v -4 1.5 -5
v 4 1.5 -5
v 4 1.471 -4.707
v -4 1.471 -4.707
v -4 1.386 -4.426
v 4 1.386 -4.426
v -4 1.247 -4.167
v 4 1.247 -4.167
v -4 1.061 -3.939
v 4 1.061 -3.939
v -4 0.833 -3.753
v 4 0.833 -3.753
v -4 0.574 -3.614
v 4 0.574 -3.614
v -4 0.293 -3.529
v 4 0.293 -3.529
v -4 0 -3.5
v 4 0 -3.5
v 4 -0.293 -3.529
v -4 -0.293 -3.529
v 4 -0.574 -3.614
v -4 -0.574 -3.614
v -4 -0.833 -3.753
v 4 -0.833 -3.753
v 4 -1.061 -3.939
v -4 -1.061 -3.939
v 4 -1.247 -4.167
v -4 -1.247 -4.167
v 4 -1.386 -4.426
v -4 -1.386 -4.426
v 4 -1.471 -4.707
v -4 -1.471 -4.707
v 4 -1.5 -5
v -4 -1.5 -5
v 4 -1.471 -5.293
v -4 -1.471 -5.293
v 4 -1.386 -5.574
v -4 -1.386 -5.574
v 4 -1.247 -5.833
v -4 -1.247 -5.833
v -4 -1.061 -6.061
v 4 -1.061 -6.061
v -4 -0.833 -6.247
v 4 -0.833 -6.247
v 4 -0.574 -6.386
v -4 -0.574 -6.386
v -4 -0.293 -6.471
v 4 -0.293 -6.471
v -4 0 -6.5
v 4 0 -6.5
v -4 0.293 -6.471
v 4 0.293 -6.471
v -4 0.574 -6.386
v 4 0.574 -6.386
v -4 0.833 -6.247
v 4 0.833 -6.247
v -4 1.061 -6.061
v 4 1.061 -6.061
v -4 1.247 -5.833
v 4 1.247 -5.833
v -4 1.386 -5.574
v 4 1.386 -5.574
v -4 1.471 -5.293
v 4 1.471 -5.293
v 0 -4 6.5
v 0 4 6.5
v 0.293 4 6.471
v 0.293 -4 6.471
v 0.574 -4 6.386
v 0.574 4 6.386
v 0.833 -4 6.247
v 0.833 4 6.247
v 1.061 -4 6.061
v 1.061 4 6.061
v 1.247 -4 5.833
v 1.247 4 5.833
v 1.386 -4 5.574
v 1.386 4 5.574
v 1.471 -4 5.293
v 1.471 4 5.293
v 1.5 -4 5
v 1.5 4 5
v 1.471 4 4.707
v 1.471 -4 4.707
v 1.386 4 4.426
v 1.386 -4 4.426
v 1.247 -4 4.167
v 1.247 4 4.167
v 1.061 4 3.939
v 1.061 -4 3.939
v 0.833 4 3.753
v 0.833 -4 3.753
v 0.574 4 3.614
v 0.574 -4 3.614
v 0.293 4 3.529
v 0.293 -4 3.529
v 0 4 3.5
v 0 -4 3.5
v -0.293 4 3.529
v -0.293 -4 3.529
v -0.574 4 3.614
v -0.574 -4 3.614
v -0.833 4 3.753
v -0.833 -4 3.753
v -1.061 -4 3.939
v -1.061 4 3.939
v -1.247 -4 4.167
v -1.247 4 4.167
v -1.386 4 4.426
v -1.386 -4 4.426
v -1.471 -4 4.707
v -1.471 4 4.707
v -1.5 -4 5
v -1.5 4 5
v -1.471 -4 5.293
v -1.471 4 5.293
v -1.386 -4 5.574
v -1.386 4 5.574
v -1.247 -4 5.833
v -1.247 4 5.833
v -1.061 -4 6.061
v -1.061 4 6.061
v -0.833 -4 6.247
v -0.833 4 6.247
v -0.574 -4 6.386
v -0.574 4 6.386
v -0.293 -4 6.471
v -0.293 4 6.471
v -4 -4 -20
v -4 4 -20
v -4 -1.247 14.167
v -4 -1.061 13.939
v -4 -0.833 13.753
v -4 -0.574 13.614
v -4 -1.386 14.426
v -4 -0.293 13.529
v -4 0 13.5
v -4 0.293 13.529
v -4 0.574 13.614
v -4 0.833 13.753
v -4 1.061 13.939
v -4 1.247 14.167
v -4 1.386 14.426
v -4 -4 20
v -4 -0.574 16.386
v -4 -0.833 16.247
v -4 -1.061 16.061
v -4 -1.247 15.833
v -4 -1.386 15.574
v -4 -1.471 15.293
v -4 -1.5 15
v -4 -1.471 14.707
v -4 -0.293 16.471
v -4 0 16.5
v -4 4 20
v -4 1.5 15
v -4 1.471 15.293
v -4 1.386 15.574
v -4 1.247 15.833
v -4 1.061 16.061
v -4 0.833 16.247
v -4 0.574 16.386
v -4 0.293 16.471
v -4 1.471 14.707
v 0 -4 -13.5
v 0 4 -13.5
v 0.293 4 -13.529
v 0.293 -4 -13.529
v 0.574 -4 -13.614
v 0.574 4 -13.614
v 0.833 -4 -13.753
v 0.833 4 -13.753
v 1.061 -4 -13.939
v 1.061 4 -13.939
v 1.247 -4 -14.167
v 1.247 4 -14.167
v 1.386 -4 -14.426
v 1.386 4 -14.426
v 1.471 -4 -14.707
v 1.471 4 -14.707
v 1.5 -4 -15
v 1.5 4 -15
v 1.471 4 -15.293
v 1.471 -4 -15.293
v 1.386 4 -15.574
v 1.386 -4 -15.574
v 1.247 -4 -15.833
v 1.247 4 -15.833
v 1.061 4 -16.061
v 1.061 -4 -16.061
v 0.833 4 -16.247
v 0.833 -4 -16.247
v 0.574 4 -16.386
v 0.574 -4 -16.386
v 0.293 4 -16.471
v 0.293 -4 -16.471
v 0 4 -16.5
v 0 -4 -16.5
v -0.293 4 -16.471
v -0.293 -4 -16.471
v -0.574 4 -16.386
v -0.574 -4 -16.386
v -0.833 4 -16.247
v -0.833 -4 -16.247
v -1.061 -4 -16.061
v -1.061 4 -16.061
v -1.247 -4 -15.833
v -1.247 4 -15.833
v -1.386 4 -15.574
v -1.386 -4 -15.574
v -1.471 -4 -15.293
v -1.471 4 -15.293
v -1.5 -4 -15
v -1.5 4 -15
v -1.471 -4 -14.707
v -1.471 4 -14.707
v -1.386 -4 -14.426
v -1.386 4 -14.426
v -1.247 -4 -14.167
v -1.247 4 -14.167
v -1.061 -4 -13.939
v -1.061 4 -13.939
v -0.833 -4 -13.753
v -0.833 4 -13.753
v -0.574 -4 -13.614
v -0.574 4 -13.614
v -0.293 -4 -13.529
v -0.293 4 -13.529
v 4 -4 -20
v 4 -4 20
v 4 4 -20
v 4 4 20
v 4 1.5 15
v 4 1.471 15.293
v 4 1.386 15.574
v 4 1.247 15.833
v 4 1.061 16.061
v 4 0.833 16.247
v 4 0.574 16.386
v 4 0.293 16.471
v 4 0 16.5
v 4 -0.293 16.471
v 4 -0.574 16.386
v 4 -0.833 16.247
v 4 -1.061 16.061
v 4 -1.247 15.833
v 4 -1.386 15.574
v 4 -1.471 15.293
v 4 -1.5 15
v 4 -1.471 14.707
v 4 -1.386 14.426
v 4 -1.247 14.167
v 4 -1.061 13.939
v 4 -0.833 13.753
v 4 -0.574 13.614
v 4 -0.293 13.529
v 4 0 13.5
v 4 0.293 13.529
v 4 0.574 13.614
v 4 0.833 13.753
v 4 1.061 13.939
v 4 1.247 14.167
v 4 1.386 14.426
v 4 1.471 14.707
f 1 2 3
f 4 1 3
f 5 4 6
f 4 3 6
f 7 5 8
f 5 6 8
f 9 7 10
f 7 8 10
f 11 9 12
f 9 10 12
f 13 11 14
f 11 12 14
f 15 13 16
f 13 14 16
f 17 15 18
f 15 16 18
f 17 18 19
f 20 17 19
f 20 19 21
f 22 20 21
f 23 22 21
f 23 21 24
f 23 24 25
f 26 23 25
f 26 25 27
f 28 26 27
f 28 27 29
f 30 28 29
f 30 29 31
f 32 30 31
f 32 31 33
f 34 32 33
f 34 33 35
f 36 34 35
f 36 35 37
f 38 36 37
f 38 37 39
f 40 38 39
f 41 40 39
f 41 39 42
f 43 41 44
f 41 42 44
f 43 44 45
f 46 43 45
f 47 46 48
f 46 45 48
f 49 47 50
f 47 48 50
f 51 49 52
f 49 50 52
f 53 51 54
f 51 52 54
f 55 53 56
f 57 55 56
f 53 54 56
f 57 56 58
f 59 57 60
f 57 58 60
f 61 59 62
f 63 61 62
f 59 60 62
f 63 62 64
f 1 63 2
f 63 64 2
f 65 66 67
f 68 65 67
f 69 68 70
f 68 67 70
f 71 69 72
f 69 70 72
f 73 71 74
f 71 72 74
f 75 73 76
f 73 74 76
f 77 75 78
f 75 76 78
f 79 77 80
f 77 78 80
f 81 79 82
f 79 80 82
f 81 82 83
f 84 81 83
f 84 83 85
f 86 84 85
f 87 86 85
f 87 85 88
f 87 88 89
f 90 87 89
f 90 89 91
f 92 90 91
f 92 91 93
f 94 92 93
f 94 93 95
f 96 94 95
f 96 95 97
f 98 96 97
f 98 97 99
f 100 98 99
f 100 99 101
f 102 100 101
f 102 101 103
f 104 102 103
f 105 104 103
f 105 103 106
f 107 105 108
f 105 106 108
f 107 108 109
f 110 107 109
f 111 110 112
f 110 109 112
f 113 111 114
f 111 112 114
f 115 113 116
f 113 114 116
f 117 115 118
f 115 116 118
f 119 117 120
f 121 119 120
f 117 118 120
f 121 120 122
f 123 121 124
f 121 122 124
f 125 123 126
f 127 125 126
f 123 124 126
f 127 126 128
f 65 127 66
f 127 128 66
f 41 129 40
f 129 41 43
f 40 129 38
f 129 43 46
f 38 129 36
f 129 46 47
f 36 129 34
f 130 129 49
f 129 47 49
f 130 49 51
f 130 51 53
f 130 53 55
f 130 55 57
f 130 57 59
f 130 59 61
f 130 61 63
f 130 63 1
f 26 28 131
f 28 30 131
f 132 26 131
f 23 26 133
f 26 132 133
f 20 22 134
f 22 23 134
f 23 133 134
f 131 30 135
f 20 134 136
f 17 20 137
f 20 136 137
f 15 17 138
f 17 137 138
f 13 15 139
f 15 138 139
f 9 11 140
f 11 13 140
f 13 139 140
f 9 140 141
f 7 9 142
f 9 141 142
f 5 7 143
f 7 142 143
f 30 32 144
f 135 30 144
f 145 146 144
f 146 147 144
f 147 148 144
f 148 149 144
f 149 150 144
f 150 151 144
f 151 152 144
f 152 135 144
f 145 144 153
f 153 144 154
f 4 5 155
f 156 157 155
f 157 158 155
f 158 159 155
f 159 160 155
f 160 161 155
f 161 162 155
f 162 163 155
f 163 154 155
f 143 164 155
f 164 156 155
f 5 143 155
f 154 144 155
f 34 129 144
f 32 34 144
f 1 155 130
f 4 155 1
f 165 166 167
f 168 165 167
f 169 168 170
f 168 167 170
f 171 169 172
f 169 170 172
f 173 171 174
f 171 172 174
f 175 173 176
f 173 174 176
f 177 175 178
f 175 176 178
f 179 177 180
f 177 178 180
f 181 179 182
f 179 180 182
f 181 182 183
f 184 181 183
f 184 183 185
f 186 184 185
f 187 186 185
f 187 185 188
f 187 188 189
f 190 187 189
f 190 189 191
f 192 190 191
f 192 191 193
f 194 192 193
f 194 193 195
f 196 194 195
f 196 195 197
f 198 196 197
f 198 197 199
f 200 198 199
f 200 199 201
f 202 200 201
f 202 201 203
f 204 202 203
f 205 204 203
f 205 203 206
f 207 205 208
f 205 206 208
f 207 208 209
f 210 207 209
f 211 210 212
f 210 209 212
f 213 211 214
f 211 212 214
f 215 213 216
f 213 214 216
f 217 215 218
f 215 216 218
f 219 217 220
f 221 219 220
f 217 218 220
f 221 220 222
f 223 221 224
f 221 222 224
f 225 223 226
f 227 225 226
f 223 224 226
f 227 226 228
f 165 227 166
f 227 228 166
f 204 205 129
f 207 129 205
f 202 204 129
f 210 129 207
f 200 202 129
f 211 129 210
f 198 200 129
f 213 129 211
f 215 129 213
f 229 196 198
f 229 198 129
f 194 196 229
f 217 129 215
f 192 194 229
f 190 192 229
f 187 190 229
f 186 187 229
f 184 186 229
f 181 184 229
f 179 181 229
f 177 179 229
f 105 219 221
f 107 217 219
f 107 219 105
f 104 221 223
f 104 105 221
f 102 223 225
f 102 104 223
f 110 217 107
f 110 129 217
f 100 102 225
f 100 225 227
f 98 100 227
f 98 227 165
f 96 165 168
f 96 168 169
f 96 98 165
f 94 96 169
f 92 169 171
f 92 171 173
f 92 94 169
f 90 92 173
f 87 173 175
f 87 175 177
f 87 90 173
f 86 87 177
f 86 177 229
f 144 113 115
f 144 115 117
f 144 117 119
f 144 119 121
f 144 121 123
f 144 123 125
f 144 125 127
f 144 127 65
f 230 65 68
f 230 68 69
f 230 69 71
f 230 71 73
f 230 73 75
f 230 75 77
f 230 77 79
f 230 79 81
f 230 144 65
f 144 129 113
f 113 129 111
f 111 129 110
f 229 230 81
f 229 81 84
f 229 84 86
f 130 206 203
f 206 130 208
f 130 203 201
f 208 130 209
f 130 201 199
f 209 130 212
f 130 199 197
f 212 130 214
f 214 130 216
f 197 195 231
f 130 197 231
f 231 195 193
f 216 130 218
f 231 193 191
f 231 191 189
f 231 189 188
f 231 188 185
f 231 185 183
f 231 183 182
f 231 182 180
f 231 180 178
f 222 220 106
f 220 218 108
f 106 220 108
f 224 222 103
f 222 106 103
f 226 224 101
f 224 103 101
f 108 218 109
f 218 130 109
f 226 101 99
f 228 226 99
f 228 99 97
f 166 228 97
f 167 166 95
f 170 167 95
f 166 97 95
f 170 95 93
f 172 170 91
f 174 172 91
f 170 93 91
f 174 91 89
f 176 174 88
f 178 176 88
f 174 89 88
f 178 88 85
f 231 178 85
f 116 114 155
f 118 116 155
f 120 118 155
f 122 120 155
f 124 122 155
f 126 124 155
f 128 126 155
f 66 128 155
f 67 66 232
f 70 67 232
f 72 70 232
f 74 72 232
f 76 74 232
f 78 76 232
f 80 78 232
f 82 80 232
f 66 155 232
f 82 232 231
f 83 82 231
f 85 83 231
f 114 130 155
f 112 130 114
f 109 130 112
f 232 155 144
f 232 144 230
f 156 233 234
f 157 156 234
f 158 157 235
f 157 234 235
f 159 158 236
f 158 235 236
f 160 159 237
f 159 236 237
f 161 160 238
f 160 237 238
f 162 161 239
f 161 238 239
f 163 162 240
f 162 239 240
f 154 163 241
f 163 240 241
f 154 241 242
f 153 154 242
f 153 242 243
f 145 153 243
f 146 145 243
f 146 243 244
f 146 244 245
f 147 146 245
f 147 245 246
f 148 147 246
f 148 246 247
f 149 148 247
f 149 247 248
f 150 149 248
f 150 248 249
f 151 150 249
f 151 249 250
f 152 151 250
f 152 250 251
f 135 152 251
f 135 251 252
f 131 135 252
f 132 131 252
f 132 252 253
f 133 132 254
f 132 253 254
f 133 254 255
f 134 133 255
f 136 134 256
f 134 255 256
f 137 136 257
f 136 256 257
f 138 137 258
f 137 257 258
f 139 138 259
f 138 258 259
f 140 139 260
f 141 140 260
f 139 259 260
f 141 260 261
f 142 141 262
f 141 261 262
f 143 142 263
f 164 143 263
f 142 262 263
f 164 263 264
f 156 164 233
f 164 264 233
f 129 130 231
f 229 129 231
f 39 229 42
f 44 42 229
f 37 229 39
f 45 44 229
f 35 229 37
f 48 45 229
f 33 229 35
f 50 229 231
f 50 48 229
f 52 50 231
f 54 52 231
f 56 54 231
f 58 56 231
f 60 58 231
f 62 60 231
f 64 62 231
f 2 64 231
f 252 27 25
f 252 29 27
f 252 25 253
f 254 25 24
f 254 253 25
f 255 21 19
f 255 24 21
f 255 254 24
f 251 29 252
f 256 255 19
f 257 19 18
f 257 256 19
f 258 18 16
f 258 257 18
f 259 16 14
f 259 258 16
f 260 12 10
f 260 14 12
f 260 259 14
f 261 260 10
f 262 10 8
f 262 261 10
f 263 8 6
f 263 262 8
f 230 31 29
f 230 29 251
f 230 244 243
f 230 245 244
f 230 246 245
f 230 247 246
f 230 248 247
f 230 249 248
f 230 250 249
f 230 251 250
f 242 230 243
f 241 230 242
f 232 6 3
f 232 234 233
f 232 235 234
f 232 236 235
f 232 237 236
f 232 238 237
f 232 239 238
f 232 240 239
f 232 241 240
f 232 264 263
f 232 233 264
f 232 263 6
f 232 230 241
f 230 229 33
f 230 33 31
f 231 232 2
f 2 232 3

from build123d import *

# Parameters (mm, degrees)
SKETCH_1_W          = 8
SKETCH_1_H          = 8
EXTRUDE_1_DEPTH     = 20
CUT_EXTRUDE_1_REACH = 23.909
SKETCH_2_R          = 1.5
CUT_EXTRUDE_2_REACH = 23.909
SKETCH_3_R          = 1.5


with BuildPart() as part:
    # 草图1 → 凸台-拉伸1 (new, symmetric)
    with BuildSketch(Plane.XY):
        Rectangle(SKETCH_1_W, SKETCH_1_H)
    extrude(amount=EXTRUDE_1_DEPTH, both=True)

    # 草图2 → 切除-拉伸1 (cut, up to next)
    with BuildSketch(Plane(origin=(4, 0, 0), x_dir=(0, 0, -1), z_dir=(1, 0, 0)), mode=Mode.PRIVATE) as cut_extrude_1_sk1:
        with Locations(Location((-15, 0, 0), (0, 0, 90))):
            Circle(SKETCH_2_R)
    cut_extrude_1_tool1 = extrude(cut_extrude_1_sk1.sketch, amount=-CUT_EXTRUDE_1_REACH, mode=Mode.PRIVATE) & part.part
    # 草图2 → 切除-拉伸1 (cut, up to next)
    with BuildSketch(Plane(origin=(4, 0, 0), x_dir=(0, 0, -1), z_dir=(1, 0, 0)), mode=Mode.PRIVATE) as cut_extrude_1_sk2:
        with Locations(Location((5, 0, 0), (0, 0, 90))):
            Circle(SKETCH_2_R)
    cut_extrude_1_tool2 = extrude(cut_extrude_1_sk2.sketch, amount=-CUT_EXTRUDE_1_REACH, mode=Mode.PRIVATE) & part.part
    add(cut_extrude_1_tool1.solids().sort_by_distance((4, 0, 15))[0], mode=Mode.SUBTRACT)
    add(cut_extrude_1_tool2.solids().sort_by_distance((4, 0, -5))[0], mode=Mode.SUBTRACT)

    # 草图3 → 切除-拉伸2 (cut, up to next)
    with BuildSketch(Plane(origin=(0, 4, 0), x_dir=(1, 0, 0), z_dir=(0, 1, 0)), mode=Mode.PRIVATE) as cut_extrude_2_sk1:
        with Locations(Location((0, 15, 0), (0, 0, 270))):
            Circle(SKETCH_3_R)
    cut_extrude_2_tool1 = extrude(cut_extrude_2_sk1.sketch, amount=-CUT_EXTRUDE_2_REACH, mode=Mode.PRIVATE) & part.part
    # 草图3 → 切除-拉伸2 (cut, up to next)
    with BuildSketch(Plane(origin=(0, 4, 0), x_dir=(1, 0, 0), z_dir=(0, 1, 0)), mode=Mode.PRIVATE) as cut_extrude_2_sk2:
        with Locations(Location((0, -5, 0), (0, 0, 270))):
            Circle(SKETCH_3_R)
    cut_extrude_2_tool2 = extrude(cut_extrude_2_sk2.sketch, amount=-CUT_EXTRUDE_2_REACH, mode=Mode.PRIVATE) & part.part
    add(cut_extrude_2_tool1.solids().sort_by_distance((0, 4, -15))[0], mode=Mode.SUBTRACT)
    add(cut_extrude_2_tool2.solids().sort_by_distance((0, 4, 5))[0], mode=Mode.SUBTRACT)


solid = part.part
